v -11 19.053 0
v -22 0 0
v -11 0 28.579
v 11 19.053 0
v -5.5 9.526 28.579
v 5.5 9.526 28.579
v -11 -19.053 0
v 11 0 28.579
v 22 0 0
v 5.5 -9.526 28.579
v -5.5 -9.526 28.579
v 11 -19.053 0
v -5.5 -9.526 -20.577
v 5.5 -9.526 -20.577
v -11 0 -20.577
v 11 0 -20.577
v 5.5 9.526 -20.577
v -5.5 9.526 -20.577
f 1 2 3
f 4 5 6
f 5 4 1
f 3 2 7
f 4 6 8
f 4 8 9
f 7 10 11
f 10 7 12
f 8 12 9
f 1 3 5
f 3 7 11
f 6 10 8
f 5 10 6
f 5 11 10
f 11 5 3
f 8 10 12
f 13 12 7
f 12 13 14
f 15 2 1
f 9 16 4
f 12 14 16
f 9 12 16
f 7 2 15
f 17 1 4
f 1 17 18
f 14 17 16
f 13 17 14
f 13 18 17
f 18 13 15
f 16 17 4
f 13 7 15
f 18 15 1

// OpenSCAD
radius = 22;
stretch = 1.50;
resolution = 64;

union() {
    intersection() {
        scale(v = [1, 1, stretch]) sphere(r = radius, $fa = 64);

        translate(v = [ 0, 0, stretch*radius])
            cube(2*stretch*radius, center=true);
    };

    scale(v = [1, 1, stretch*0.72])
        difference() {

            sphere(r = radius, $fa = 64);

            translate(v = [ 0, 0, stretch*radius])
                cube(2*stretch*radius, center=true);
        };

}
